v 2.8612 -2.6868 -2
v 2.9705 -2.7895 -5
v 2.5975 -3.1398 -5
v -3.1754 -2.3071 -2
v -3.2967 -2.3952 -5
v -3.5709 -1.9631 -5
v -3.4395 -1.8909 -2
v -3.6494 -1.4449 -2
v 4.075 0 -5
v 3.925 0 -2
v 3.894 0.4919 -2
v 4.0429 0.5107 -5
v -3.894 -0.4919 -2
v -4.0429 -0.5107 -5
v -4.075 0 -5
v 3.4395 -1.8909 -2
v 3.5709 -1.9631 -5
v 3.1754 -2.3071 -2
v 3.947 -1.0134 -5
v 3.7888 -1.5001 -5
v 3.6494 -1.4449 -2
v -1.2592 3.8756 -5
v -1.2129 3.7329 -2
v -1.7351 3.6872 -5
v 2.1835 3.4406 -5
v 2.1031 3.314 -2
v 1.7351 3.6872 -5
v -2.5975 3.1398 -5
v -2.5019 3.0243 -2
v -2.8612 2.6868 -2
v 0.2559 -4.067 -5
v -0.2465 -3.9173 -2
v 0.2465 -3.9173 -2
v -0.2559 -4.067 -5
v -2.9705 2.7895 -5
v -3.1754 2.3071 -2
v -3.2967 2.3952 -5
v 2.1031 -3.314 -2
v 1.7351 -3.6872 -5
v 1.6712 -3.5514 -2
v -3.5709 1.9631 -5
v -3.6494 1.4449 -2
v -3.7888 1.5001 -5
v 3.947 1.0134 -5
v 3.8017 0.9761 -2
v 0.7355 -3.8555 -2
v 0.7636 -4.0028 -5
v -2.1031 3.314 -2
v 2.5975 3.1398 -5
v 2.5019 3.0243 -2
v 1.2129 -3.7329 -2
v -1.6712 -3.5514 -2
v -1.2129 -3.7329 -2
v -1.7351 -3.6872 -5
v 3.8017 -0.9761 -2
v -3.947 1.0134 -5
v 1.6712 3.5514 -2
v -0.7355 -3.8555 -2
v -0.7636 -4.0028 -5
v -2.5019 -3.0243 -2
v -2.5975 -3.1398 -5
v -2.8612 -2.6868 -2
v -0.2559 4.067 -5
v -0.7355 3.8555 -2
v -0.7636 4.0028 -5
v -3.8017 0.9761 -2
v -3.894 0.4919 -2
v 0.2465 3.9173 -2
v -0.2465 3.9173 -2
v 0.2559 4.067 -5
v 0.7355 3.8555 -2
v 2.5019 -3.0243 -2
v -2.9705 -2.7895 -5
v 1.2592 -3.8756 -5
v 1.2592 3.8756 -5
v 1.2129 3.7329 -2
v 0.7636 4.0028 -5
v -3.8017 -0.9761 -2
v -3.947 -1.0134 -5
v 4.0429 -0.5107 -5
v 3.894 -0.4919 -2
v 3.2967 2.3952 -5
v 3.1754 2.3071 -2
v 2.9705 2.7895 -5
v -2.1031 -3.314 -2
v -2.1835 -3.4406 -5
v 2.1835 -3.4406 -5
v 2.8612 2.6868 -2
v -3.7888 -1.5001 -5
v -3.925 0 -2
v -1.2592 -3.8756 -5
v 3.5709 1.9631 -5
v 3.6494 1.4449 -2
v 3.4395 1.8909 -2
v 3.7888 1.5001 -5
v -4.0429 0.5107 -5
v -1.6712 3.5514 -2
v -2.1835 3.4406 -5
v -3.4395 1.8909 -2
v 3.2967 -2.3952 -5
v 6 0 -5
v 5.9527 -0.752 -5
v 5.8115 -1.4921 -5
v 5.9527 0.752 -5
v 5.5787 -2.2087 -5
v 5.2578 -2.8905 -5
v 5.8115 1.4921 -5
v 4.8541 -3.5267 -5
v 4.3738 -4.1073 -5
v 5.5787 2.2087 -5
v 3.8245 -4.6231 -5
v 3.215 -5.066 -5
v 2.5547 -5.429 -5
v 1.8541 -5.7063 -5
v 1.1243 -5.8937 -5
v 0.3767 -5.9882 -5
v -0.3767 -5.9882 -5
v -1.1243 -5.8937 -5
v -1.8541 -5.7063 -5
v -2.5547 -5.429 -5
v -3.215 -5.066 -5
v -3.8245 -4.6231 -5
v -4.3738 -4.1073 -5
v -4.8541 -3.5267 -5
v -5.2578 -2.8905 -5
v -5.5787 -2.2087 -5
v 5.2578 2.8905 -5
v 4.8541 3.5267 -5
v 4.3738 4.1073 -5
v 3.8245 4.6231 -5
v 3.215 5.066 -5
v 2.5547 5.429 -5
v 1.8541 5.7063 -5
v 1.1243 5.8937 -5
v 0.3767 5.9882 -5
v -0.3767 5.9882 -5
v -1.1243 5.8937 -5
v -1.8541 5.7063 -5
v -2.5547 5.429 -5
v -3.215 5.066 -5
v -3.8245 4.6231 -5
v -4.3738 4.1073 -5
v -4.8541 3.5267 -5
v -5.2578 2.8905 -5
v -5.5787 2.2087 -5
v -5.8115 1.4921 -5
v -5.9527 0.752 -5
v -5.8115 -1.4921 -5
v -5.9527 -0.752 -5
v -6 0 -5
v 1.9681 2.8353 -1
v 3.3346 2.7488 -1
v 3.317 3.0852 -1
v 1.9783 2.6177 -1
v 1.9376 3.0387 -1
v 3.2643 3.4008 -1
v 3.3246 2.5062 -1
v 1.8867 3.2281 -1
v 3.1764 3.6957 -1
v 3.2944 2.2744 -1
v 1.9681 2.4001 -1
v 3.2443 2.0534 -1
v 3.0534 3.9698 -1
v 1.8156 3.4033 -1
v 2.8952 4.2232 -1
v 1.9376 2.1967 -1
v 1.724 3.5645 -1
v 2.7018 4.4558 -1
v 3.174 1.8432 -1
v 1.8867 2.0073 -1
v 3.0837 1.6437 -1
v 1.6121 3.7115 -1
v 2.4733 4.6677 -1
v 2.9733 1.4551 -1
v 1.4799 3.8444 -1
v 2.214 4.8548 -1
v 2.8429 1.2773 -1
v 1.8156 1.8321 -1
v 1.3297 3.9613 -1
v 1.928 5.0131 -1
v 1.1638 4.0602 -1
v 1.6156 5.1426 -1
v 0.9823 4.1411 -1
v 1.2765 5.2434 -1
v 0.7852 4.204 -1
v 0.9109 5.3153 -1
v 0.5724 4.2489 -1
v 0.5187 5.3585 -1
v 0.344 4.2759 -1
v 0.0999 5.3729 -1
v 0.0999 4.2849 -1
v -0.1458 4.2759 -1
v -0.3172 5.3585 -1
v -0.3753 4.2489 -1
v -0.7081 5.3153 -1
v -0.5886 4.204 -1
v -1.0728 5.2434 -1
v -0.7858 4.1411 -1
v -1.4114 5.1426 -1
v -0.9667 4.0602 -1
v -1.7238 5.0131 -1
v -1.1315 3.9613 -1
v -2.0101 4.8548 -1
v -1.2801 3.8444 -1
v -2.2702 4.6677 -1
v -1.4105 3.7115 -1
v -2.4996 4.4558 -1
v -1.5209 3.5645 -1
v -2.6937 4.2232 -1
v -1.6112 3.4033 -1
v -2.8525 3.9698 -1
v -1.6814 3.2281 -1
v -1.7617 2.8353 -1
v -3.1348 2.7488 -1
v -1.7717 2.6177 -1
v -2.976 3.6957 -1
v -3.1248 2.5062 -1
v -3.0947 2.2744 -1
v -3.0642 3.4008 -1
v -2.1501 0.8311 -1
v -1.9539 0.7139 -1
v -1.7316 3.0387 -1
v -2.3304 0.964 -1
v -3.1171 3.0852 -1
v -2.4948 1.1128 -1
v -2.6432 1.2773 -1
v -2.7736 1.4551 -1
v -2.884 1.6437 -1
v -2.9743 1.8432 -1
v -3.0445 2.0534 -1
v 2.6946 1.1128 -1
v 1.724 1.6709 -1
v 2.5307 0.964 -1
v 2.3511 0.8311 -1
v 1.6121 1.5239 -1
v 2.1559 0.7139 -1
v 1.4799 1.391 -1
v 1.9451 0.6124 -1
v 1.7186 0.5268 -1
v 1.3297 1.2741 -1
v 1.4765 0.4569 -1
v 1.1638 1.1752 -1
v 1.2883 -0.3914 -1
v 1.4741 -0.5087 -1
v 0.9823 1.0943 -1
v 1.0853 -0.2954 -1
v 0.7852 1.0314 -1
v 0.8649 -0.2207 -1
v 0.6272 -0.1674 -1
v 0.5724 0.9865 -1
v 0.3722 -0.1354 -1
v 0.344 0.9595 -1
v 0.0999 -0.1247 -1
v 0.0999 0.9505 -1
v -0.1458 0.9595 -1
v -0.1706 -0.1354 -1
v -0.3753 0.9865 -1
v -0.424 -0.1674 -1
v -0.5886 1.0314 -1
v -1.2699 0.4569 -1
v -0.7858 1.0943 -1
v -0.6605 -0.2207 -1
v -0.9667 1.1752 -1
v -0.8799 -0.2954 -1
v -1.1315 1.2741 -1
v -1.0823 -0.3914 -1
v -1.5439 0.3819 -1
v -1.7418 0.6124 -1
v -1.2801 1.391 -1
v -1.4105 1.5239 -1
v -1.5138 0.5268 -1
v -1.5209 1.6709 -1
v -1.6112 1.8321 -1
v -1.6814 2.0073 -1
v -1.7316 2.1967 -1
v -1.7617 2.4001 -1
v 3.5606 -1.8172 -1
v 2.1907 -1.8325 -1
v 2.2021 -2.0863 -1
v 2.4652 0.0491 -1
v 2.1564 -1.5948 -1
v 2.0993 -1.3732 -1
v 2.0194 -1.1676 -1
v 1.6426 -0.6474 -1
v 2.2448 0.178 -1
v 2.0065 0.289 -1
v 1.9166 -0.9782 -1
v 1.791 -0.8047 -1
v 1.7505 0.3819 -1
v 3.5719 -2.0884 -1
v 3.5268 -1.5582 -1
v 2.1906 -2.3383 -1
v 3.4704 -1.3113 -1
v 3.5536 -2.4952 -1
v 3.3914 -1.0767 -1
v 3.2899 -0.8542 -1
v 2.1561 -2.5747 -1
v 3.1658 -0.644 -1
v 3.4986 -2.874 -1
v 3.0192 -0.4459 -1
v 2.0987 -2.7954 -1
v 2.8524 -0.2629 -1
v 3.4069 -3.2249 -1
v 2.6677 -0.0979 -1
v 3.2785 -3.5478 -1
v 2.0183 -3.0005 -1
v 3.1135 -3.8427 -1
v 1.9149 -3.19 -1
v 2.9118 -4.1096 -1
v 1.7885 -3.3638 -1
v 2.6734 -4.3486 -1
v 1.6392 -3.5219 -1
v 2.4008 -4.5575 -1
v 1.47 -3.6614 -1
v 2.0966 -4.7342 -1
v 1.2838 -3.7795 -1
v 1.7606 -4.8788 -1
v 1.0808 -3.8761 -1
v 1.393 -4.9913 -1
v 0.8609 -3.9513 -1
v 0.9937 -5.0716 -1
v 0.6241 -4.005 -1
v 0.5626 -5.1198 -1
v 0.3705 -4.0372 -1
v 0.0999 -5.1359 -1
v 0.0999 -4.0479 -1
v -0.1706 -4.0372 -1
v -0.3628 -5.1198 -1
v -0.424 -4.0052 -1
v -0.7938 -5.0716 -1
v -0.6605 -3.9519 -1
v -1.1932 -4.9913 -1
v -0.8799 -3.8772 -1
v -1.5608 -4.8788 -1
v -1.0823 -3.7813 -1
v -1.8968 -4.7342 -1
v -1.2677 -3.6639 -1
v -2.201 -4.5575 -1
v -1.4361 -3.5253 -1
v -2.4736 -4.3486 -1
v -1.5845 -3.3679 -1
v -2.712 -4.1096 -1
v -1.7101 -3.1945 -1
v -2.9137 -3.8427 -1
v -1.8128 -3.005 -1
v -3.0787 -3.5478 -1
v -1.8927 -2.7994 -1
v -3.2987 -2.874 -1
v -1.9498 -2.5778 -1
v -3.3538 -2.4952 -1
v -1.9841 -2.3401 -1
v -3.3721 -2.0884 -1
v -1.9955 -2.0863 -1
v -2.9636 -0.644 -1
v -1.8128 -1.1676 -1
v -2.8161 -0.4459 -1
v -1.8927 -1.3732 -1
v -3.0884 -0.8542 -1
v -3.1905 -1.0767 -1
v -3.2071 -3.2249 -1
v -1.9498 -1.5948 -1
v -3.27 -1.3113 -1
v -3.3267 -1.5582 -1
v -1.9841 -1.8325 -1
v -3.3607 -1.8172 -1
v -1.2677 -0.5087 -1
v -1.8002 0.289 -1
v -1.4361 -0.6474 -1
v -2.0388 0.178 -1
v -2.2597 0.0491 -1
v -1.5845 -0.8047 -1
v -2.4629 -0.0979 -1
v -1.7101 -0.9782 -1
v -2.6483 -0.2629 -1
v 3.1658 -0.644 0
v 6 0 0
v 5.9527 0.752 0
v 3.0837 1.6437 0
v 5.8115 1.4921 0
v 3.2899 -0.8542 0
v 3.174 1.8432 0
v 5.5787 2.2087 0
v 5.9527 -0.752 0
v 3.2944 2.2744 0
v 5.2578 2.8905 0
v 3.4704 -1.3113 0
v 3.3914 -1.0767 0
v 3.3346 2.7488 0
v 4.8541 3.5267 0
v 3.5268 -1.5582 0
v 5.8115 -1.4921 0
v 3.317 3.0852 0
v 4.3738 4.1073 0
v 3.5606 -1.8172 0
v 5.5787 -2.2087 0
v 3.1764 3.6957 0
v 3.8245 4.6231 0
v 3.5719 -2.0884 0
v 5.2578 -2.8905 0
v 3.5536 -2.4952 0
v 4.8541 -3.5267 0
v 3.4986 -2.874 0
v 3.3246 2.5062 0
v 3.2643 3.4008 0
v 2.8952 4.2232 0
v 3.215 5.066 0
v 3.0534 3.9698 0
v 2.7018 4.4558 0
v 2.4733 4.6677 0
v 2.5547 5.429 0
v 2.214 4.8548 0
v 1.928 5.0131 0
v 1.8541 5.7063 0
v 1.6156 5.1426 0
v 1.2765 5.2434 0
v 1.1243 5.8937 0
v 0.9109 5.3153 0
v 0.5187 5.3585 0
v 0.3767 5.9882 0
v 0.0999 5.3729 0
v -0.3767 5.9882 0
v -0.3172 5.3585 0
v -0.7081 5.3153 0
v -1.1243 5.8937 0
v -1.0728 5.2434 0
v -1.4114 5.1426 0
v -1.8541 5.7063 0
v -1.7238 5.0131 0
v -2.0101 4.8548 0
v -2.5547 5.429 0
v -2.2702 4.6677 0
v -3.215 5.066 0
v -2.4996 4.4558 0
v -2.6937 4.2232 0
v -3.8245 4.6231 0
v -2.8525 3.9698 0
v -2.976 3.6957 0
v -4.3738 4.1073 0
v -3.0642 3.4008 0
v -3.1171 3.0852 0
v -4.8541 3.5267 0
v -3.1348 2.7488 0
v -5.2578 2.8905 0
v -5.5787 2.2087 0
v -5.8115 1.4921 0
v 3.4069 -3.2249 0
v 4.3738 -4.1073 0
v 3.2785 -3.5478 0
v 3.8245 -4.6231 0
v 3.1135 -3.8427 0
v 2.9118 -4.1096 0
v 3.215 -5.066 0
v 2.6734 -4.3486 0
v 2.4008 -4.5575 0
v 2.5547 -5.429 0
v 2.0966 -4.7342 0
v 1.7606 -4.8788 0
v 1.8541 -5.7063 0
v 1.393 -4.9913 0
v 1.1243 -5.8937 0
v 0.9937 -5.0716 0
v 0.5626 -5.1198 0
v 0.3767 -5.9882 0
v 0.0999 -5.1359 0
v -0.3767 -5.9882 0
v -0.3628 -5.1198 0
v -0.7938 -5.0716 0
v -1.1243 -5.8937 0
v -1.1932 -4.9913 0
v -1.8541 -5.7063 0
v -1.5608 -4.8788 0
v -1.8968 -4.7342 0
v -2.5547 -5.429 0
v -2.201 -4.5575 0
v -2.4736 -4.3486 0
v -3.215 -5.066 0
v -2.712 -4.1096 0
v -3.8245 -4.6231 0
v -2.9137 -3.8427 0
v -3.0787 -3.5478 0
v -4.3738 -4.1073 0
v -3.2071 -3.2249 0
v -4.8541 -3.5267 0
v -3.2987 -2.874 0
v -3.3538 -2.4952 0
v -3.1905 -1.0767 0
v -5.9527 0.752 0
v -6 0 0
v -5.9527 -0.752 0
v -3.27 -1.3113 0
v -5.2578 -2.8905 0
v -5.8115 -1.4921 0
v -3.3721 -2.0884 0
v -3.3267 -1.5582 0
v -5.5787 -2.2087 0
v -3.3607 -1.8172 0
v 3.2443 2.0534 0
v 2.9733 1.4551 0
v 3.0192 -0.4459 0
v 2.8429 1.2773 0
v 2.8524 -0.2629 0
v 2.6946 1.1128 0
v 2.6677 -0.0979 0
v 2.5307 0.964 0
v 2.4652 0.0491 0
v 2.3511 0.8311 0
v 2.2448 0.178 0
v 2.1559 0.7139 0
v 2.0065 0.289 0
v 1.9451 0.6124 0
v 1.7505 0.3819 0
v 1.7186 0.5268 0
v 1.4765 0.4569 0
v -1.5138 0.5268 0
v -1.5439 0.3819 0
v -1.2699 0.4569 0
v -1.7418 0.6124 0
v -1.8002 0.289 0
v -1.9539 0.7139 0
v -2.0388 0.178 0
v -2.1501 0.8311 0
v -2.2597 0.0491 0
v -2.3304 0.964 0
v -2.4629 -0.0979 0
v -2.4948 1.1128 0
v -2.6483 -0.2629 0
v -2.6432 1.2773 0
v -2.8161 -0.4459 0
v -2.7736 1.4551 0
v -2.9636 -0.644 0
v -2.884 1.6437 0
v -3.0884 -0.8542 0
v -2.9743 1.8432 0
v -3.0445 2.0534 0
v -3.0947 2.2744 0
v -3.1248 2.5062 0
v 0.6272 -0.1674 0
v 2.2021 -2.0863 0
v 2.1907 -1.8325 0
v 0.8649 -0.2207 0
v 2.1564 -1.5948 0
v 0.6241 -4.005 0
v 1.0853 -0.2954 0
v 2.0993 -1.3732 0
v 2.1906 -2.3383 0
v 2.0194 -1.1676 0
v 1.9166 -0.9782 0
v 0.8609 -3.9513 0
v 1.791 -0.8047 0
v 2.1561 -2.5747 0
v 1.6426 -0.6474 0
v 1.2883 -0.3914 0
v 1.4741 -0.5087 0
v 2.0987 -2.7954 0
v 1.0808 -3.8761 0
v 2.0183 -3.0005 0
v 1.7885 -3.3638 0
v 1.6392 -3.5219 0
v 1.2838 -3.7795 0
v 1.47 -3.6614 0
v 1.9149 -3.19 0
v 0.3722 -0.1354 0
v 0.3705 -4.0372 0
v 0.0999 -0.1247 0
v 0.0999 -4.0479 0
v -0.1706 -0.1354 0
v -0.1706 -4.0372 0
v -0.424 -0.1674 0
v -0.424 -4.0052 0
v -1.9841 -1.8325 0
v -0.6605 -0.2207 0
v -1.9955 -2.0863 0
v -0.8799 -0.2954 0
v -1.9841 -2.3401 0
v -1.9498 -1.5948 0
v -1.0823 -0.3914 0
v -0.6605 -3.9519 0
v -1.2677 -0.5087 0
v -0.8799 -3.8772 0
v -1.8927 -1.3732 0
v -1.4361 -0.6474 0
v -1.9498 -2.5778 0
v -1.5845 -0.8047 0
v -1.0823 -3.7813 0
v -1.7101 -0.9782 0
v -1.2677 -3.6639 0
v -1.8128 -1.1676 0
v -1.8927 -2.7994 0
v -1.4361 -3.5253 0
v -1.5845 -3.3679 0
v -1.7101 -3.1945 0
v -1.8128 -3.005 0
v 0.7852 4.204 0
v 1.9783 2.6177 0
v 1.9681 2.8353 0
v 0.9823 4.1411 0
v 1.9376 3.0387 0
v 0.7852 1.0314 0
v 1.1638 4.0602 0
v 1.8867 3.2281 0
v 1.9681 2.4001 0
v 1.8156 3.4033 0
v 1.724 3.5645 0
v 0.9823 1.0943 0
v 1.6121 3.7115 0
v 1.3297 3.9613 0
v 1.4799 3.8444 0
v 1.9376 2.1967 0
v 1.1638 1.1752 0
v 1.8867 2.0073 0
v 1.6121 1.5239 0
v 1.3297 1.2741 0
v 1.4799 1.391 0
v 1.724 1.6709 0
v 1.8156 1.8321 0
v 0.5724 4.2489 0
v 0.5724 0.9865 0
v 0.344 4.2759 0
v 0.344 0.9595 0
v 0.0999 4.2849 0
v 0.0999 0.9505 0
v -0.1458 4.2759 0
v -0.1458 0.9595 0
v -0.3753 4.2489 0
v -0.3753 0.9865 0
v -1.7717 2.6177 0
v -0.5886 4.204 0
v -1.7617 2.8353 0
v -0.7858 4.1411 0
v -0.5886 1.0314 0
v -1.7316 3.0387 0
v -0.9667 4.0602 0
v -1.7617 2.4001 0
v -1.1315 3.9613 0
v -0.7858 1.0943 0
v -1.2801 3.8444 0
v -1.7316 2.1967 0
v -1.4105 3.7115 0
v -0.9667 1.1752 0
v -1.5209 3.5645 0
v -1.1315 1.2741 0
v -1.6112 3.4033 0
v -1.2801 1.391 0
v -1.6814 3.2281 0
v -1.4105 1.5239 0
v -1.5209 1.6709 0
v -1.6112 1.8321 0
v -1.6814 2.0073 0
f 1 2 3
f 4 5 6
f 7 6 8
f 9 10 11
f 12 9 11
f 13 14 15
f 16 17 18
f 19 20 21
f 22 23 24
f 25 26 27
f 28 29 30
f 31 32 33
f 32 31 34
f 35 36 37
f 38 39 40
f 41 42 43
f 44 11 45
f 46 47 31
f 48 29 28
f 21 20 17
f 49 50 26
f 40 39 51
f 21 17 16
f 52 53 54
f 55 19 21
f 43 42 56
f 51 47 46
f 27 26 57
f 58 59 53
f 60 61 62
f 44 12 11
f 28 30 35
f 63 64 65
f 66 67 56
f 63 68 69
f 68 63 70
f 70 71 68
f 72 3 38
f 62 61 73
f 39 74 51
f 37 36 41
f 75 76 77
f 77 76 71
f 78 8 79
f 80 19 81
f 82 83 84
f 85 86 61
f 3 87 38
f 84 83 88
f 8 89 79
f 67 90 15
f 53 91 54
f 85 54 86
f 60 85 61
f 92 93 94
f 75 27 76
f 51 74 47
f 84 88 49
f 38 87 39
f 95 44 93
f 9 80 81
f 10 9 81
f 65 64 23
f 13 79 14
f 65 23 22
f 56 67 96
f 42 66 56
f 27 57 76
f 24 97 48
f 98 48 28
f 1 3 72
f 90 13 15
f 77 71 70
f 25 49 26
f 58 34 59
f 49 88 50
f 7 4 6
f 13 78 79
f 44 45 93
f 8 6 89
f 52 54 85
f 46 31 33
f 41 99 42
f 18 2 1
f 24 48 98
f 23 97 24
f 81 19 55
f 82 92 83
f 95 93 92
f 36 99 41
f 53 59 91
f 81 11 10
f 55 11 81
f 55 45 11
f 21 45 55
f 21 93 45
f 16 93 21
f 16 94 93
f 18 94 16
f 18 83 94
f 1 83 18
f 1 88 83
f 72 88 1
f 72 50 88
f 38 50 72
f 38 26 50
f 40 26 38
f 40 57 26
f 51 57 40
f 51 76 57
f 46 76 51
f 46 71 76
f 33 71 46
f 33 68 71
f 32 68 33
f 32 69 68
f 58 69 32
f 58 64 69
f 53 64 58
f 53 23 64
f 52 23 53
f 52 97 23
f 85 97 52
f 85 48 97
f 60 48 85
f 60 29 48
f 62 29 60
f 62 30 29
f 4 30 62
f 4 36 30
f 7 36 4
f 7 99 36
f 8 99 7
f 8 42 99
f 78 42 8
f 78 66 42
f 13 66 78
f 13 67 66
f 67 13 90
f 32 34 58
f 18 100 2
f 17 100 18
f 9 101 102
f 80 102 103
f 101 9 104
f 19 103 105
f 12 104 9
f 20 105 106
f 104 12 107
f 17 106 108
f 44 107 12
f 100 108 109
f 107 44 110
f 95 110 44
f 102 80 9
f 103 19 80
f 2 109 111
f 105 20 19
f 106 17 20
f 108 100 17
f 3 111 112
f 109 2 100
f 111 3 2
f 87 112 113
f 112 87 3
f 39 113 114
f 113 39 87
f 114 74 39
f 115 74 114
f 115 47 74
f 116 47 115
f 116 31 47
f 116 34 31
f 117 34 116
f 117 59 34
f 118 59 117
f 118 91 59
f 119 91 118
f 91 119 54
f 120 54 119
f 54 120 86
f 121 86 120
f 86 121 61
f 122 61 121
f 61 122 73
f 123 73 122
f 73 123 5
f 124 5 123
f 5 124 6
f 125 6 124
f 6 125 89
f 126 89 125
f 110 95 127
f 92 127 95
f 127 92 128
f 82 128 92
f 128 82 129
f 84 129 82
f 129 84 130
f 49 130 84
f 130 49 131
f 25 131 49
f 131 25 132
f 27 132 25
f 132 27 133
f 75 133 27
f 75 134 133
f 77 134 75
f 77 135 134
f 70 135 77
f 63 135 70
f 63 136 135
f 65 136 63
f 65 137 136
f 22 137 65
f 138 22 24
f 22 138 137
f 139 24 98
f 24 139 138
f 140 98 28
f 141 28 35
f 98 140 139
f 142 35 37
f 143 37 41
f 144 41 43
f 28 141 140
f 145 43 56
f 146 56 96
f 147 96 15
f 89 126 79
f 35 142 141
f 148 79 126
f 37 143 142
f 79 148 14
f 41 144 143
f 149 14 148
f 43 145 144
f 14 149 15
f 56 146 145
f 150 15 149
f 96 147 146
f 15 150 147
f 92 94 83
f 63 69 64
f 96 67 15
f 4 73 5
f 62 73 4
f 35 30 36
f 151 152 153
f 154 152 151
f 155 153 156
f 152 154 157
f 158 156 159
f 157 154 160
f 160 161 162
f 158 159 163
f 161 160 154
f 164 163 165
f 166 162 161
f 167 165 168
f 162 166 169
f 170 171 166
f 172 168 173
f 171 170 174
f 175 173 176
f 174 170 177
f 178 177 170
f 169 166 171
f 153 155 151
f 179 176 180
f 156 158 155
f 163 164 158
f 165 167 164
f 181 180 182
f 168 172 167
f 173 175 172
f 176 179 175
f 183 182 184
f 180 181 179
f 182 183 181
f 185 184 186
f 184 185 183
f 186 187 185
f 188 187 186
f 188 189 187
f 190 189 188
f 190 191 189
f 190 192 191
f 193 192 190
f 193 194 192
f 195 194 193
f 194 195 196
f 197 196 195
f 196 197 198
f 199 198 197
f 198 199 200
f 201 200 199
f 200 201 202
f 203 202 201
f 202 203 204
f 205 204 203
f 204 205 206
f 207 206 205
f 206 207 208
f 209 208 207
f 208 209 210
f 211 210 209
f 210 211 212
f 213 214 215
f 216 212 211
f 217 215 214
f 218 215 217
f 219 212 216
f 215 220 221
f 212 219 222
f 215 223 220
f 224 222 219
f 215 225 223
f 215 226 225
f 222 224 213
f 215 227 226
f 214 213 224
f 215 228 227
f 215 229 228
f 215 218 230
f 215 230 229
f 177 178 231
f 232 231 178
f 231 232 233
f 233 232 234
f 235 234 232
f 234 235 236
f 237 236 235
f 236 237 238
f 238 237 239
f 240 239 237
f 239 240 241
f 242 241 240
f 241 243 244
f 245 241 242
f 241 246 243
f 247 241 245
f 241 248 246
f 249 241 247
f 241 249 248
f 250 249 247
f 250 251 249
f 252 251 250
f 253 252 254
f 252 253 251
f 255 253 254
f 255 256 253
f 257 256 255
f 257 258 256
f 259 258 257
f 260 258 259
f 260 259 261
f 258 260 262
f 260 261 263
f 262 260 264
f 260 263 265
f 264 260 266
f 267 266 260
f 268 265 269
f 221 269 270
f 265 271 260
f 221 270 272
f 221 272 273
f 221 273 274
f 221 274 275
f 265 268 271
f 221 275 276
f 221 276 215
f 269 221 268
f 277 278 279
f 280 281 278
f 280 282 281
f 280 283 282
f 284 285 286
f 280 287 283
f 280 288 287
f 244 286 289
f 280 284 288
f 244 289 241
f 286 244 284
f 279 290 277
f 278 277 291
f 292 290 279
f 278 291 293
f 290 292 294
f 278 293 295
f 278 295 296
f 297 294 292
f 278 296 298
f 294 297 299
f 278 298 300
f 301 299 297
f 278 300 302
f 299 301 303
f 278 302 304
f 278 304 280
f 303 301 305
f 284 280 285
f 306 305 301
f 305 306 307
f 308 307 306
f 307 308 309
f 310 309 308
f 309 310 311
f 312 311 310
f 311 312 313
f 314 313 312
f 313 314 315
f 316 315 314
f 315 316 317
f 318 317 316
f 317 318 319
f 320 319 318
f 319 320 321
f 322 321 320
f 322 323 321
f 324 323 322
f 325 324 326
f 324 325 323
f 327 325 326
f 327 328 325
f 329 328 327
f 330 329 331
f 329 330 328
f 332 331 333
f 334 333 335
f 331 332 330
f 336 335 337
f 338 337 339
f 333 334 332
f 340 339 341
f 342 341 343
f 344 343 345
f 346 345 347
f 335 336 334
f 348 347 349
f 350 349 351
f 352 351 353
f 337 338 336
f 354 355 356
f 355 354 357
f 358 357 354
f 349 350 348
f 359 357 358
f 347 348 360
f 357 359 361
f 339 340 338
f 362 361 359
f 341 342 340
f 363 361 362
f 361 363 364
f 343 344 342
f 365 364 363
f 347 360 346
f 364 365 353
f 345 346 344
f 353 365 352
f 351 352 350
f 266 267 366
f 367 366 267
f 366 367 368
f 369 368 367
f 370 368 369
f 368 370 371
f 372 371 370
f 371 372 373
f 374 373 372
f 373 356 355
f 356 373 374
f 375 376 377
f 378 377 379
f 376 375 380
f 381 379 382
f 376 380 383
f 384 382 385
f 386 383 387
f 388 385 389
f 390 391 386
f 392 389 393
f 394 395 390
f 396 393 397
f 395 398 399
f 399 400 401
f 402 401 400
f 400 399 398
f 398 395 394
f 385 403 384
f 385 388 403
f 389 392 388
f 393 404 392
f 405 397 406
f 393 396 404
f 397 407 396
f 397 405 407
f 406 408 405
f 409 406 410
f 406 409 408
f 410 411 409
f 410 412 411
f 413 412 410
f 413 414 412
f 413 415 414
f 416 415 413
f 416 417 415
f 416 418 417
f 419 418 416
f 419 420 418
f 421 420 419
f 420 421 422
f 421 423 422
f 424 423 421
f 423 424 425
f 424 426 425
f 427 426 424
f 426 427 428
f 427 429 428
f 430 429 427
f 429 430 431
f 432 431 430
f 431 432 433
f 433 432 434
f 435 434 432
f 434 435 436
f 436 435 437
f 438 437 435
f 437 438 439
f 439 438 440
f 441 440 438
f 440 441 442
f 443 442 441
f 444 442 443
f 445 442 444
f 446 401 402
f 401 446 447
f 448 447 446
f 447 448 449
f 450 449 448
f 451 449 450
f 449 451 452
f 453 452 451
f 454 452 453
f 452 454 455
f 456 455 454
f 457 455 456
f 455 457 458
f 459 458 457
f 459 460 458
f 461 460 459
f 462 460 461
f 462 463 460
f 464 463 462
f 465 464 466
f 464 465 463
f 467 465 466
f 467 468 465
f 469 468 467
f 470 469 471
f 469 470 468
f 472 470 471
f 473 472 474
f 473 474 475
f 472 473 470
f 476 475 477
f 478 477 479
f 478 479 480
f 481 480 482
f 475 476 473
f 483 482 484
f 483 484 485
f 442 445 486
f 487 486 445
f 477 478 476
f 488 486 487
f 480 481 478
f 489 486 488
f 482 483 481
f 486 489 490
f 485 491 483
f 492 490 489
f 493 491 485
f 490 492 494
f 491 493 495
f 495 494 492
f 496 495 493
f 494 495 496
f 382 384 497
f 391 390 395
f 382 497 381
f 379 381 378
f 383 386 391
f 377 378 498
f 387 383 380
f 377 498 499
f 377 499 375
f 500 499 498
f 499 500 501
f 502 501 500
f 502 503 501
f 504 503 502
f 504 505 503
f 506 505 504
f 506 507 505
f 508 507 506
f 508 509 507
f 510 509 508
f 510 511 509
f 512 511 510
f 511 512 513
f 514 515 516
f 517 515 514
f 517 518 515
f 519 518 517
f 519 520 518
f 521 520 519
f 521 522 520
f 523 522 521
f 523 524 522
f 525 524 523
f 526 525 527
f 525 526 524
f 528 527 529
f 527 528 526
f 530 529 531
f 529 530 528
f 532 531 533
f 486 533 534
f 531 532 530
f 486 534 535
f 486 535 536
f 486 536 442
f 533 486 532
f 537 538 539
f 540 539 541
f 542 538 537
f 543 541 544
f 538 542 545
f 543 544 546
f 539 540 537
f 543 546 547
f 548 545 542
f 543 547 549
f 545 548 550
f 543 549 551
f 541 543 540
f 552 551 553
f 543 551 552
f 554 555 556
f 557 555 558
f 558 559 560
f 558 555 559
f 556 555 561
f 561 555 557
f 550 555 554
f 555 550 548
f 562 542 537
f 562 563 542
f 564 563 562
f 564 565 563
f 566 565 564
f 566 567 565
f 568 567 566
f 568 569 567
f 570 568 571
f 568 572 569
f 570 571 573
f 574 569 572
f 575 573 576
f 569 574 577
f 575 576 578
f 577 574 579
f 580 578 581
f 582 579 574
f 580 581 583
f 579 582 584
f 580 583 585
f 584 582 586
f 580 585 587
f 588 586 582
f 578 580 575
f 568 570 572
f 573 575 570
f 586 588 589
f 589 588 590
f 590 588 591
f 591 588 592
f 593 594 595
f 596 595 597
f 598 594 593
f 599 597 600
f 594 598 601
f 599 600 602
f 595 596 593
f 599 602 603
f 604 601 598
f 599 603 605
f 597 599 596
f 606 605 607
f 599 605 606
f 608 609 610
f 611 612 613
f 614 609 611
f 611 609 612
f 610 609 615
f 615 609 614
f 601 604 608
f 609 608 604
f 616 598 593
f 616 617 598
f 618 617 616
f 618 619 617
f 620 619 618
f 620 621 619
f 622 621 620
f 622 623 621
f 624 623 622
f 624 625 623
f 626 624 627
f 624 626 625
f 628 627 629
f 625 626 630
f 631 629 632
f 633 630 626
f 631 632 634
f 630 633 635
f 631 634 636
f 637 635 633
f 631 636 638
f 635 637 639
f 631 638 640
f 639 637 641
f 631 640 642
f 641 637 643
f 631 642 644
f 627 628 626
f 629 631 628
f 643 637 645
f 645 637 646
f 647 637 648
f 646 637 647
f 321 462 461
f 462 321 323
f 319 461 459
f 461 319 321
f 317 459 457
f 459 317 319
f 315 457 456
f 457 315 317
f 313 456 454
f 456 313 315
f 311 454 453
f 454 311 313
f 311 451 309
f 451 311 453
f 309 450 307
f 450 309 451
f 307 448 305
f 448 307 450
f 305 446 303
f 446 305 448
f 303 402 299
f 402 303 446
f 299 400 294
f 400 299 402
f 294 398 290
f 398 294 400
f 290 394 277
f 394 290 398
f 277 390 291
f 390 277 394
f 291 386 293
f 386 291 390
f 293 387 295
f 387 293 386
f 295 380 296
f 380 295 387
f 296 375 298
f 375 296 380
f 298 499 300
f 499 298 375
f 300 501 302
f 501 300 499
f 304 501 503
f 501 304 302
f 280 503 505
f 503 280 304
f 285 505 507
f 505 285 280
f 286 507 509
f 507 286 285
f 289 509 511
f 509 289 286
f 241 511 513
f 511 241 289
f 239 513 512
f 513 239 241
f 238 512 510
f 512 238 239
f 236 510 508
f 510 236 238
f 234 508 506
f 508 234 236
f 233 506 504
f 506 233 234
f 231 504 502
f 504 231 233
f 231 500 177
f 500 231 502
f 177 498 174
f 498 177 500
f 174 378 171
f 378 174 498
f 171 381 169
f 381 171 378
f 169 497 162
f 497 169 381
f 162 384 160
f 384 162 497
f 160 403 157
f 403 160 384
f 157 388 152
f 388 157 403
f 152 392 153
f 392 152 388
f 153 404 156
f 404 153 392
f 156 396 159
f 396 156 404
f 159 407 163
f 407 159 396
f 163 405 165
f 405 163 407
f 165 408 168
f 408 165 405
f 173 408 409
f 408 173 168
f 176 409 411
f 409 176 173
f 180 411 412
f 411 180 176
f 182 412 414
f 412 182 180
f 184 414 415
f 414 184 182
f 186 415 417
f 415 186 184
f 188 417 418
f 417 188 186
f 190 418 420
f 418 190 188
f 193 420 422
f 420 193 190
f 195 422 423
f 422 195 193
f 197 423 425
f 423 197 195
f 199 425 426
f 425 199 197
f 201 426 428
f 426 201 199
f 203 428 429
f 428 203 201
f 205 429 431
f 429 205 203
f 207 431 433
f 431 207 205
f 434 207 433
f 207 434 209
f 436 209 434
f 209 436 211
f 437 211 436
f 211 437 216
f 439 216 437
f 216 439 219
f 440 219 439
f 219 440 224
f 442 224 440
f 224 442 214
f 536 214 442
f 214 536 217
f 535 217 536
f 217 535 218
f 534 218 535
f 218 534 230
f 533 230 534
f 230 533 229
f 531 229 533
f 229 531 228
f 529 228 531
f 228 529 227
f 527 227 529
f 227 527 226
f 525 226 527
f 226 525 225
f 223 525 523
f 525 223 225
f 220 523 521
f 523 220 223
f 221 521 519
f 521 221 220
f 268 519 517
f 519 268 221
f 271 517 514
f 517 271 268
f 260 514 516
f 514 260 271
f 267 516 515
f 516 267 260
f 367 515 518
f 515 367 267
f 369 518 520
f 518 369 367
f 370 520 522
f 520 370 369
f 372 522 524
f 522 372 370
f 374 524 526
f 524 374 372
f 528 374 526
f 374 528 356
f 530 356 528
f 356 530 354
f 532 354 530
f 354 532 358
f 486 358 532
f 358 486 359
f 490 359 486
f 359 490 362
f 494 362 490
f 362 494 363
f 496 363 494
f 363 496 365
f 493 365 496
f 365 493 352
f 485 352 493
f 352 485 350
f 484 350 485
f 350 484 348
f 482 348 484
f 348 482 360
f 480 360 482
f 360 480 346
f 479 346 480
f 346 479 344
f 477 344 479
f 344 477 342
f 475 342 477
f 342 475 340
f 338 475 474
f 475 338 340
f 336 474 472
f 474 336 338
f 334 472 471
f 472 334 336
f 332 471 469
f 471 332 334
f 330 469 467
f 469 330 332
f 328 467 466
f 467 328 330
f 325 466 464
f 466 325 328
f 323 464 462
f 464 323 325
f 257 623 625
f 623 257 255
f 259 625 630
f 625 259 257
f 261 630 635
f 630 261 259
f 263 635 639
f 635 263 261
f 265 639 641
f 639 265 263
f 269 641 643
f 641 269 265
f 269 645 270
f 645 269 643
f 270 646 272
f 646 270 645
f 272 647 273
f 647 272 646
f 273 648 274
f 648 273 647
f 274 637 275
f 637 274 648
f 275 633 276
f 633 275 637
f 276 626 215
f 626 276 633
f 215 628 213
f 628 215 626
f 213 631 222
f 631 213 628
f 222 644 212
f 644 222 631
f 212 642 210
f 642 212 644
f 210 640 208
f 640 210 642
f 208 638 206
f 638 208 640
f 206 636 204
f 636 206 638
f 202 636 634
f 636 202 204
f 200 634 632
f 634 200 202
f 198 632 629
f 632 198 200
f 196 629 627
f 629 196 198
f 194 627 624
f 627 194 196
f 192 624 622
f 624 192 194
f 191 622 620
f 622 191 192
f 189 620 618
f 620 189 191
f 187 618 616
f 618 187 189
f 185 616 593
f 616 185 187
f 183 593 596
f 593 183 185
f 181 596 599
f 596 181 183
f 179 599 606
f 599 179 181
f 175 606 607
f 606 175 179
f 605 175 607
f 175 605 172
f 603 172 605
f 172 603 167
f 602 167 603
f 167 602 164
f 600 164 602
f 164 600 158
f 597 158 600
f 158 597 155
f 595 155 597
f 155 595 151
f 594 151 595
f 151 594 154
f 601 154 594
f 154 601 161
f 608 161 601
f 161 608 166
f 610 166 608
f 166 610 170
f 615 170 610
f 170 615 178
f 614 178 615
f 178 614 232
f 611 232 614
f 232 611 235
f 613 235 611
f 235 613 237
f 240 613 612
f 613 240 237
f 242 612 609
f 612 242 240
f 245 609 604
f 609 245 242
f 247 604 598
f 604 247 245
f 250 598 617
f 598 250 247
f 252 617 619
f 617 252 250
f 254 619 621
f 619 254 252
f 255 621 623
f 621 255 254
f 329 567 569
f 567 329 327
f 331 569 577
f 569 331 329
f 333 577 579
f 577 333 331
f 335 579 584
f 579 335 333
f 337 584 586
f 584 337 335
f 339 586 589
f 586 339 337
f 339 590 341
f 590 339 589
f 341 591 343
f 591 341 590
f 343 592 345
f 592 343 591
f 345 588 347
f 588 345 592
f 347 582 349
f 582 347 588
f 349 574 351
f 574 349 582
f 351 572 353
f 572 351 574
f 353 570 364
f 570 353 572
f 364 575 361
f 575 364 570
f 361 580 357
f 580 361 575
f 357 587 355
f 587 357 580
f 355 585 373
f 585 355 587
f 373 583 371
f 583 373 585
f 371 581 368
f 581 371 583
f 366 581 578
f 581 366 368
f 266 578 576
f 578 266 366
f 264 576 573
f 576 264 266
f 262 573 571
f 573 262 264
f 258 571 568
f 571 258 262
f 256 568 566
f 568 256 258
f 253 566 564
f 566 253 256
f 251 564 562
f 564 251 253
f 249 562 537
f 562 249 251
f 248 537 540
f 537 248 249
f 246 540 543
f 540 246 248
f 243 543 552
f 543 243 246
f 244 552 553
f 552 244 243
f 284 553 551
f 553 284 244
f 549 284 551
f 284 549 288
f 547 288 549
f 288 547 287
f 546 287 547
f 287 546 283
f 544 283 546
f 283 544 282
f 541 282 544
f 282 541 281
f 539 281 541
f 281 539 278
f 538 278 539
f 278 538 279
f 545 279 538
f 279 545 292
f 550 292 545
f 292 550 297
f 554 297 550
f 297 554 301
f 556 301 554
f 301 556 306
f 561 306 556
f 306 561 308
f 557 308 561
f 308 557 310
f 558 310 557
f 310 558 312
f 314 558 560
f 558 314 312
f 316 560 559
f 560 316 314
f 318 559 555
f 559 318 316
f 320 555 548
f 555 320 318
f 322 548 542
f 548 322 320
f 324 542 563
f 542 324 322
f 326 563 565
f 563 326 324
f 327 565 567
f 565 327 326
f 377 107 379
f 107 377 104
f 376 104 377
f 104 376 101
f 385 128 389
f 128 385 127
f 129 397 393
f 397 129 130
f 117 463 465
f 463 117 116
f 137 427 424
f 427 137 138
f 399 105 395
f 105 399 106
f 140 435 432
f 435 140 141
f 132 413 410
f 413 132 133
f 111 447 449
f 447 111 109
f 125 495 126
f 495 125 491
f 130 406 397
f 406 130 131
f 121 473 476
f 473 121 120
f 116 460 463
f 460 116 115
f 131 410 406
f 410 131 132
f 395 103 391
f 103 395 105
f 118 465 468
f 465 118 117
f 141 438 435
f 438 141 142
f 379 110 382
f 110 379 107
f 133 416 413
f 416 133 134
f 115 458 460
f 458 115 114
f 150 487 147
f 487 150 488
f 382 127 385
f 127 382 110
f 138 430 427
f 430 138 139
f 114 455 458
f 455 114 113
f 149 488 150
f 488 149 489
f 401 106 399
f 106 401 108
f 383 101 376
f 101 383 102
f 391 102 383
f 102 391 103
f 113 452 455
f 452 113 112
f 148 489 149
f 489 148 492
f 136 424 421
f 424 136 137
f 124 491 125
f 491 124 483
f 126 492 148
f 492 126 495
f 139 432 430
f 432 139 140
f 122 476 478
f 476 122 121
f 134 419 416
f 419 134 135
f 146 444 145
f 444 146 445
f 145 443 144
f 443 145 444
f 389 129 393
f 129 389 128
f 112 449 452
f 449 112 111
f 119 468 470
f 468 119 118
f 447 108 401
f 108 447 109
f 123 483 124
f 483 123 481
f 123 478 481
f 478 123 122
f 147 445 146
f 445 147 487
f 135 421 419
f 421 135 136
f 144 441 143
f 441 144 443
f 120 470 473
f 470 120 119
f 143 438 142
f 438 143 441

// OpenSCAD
$fn = 50;

difference() {
	union() {
		translate(v = [0, 0, -5.0]) {
			cylinder(h = 5, r = 6.0);
		}
	}
	union() {
		#translate(v = [0, 0, -5.0]) {
			cylinder(h = 3, r1 = 4.075, r2 = 3.925);
		}
		translate(v = [0, 0, -1]) {
			linear_extrude(height = 1) {
				text(font = "Impact", halign = "center", size = 10, text = "8", valign = "center");
			}
		}
	}
}
